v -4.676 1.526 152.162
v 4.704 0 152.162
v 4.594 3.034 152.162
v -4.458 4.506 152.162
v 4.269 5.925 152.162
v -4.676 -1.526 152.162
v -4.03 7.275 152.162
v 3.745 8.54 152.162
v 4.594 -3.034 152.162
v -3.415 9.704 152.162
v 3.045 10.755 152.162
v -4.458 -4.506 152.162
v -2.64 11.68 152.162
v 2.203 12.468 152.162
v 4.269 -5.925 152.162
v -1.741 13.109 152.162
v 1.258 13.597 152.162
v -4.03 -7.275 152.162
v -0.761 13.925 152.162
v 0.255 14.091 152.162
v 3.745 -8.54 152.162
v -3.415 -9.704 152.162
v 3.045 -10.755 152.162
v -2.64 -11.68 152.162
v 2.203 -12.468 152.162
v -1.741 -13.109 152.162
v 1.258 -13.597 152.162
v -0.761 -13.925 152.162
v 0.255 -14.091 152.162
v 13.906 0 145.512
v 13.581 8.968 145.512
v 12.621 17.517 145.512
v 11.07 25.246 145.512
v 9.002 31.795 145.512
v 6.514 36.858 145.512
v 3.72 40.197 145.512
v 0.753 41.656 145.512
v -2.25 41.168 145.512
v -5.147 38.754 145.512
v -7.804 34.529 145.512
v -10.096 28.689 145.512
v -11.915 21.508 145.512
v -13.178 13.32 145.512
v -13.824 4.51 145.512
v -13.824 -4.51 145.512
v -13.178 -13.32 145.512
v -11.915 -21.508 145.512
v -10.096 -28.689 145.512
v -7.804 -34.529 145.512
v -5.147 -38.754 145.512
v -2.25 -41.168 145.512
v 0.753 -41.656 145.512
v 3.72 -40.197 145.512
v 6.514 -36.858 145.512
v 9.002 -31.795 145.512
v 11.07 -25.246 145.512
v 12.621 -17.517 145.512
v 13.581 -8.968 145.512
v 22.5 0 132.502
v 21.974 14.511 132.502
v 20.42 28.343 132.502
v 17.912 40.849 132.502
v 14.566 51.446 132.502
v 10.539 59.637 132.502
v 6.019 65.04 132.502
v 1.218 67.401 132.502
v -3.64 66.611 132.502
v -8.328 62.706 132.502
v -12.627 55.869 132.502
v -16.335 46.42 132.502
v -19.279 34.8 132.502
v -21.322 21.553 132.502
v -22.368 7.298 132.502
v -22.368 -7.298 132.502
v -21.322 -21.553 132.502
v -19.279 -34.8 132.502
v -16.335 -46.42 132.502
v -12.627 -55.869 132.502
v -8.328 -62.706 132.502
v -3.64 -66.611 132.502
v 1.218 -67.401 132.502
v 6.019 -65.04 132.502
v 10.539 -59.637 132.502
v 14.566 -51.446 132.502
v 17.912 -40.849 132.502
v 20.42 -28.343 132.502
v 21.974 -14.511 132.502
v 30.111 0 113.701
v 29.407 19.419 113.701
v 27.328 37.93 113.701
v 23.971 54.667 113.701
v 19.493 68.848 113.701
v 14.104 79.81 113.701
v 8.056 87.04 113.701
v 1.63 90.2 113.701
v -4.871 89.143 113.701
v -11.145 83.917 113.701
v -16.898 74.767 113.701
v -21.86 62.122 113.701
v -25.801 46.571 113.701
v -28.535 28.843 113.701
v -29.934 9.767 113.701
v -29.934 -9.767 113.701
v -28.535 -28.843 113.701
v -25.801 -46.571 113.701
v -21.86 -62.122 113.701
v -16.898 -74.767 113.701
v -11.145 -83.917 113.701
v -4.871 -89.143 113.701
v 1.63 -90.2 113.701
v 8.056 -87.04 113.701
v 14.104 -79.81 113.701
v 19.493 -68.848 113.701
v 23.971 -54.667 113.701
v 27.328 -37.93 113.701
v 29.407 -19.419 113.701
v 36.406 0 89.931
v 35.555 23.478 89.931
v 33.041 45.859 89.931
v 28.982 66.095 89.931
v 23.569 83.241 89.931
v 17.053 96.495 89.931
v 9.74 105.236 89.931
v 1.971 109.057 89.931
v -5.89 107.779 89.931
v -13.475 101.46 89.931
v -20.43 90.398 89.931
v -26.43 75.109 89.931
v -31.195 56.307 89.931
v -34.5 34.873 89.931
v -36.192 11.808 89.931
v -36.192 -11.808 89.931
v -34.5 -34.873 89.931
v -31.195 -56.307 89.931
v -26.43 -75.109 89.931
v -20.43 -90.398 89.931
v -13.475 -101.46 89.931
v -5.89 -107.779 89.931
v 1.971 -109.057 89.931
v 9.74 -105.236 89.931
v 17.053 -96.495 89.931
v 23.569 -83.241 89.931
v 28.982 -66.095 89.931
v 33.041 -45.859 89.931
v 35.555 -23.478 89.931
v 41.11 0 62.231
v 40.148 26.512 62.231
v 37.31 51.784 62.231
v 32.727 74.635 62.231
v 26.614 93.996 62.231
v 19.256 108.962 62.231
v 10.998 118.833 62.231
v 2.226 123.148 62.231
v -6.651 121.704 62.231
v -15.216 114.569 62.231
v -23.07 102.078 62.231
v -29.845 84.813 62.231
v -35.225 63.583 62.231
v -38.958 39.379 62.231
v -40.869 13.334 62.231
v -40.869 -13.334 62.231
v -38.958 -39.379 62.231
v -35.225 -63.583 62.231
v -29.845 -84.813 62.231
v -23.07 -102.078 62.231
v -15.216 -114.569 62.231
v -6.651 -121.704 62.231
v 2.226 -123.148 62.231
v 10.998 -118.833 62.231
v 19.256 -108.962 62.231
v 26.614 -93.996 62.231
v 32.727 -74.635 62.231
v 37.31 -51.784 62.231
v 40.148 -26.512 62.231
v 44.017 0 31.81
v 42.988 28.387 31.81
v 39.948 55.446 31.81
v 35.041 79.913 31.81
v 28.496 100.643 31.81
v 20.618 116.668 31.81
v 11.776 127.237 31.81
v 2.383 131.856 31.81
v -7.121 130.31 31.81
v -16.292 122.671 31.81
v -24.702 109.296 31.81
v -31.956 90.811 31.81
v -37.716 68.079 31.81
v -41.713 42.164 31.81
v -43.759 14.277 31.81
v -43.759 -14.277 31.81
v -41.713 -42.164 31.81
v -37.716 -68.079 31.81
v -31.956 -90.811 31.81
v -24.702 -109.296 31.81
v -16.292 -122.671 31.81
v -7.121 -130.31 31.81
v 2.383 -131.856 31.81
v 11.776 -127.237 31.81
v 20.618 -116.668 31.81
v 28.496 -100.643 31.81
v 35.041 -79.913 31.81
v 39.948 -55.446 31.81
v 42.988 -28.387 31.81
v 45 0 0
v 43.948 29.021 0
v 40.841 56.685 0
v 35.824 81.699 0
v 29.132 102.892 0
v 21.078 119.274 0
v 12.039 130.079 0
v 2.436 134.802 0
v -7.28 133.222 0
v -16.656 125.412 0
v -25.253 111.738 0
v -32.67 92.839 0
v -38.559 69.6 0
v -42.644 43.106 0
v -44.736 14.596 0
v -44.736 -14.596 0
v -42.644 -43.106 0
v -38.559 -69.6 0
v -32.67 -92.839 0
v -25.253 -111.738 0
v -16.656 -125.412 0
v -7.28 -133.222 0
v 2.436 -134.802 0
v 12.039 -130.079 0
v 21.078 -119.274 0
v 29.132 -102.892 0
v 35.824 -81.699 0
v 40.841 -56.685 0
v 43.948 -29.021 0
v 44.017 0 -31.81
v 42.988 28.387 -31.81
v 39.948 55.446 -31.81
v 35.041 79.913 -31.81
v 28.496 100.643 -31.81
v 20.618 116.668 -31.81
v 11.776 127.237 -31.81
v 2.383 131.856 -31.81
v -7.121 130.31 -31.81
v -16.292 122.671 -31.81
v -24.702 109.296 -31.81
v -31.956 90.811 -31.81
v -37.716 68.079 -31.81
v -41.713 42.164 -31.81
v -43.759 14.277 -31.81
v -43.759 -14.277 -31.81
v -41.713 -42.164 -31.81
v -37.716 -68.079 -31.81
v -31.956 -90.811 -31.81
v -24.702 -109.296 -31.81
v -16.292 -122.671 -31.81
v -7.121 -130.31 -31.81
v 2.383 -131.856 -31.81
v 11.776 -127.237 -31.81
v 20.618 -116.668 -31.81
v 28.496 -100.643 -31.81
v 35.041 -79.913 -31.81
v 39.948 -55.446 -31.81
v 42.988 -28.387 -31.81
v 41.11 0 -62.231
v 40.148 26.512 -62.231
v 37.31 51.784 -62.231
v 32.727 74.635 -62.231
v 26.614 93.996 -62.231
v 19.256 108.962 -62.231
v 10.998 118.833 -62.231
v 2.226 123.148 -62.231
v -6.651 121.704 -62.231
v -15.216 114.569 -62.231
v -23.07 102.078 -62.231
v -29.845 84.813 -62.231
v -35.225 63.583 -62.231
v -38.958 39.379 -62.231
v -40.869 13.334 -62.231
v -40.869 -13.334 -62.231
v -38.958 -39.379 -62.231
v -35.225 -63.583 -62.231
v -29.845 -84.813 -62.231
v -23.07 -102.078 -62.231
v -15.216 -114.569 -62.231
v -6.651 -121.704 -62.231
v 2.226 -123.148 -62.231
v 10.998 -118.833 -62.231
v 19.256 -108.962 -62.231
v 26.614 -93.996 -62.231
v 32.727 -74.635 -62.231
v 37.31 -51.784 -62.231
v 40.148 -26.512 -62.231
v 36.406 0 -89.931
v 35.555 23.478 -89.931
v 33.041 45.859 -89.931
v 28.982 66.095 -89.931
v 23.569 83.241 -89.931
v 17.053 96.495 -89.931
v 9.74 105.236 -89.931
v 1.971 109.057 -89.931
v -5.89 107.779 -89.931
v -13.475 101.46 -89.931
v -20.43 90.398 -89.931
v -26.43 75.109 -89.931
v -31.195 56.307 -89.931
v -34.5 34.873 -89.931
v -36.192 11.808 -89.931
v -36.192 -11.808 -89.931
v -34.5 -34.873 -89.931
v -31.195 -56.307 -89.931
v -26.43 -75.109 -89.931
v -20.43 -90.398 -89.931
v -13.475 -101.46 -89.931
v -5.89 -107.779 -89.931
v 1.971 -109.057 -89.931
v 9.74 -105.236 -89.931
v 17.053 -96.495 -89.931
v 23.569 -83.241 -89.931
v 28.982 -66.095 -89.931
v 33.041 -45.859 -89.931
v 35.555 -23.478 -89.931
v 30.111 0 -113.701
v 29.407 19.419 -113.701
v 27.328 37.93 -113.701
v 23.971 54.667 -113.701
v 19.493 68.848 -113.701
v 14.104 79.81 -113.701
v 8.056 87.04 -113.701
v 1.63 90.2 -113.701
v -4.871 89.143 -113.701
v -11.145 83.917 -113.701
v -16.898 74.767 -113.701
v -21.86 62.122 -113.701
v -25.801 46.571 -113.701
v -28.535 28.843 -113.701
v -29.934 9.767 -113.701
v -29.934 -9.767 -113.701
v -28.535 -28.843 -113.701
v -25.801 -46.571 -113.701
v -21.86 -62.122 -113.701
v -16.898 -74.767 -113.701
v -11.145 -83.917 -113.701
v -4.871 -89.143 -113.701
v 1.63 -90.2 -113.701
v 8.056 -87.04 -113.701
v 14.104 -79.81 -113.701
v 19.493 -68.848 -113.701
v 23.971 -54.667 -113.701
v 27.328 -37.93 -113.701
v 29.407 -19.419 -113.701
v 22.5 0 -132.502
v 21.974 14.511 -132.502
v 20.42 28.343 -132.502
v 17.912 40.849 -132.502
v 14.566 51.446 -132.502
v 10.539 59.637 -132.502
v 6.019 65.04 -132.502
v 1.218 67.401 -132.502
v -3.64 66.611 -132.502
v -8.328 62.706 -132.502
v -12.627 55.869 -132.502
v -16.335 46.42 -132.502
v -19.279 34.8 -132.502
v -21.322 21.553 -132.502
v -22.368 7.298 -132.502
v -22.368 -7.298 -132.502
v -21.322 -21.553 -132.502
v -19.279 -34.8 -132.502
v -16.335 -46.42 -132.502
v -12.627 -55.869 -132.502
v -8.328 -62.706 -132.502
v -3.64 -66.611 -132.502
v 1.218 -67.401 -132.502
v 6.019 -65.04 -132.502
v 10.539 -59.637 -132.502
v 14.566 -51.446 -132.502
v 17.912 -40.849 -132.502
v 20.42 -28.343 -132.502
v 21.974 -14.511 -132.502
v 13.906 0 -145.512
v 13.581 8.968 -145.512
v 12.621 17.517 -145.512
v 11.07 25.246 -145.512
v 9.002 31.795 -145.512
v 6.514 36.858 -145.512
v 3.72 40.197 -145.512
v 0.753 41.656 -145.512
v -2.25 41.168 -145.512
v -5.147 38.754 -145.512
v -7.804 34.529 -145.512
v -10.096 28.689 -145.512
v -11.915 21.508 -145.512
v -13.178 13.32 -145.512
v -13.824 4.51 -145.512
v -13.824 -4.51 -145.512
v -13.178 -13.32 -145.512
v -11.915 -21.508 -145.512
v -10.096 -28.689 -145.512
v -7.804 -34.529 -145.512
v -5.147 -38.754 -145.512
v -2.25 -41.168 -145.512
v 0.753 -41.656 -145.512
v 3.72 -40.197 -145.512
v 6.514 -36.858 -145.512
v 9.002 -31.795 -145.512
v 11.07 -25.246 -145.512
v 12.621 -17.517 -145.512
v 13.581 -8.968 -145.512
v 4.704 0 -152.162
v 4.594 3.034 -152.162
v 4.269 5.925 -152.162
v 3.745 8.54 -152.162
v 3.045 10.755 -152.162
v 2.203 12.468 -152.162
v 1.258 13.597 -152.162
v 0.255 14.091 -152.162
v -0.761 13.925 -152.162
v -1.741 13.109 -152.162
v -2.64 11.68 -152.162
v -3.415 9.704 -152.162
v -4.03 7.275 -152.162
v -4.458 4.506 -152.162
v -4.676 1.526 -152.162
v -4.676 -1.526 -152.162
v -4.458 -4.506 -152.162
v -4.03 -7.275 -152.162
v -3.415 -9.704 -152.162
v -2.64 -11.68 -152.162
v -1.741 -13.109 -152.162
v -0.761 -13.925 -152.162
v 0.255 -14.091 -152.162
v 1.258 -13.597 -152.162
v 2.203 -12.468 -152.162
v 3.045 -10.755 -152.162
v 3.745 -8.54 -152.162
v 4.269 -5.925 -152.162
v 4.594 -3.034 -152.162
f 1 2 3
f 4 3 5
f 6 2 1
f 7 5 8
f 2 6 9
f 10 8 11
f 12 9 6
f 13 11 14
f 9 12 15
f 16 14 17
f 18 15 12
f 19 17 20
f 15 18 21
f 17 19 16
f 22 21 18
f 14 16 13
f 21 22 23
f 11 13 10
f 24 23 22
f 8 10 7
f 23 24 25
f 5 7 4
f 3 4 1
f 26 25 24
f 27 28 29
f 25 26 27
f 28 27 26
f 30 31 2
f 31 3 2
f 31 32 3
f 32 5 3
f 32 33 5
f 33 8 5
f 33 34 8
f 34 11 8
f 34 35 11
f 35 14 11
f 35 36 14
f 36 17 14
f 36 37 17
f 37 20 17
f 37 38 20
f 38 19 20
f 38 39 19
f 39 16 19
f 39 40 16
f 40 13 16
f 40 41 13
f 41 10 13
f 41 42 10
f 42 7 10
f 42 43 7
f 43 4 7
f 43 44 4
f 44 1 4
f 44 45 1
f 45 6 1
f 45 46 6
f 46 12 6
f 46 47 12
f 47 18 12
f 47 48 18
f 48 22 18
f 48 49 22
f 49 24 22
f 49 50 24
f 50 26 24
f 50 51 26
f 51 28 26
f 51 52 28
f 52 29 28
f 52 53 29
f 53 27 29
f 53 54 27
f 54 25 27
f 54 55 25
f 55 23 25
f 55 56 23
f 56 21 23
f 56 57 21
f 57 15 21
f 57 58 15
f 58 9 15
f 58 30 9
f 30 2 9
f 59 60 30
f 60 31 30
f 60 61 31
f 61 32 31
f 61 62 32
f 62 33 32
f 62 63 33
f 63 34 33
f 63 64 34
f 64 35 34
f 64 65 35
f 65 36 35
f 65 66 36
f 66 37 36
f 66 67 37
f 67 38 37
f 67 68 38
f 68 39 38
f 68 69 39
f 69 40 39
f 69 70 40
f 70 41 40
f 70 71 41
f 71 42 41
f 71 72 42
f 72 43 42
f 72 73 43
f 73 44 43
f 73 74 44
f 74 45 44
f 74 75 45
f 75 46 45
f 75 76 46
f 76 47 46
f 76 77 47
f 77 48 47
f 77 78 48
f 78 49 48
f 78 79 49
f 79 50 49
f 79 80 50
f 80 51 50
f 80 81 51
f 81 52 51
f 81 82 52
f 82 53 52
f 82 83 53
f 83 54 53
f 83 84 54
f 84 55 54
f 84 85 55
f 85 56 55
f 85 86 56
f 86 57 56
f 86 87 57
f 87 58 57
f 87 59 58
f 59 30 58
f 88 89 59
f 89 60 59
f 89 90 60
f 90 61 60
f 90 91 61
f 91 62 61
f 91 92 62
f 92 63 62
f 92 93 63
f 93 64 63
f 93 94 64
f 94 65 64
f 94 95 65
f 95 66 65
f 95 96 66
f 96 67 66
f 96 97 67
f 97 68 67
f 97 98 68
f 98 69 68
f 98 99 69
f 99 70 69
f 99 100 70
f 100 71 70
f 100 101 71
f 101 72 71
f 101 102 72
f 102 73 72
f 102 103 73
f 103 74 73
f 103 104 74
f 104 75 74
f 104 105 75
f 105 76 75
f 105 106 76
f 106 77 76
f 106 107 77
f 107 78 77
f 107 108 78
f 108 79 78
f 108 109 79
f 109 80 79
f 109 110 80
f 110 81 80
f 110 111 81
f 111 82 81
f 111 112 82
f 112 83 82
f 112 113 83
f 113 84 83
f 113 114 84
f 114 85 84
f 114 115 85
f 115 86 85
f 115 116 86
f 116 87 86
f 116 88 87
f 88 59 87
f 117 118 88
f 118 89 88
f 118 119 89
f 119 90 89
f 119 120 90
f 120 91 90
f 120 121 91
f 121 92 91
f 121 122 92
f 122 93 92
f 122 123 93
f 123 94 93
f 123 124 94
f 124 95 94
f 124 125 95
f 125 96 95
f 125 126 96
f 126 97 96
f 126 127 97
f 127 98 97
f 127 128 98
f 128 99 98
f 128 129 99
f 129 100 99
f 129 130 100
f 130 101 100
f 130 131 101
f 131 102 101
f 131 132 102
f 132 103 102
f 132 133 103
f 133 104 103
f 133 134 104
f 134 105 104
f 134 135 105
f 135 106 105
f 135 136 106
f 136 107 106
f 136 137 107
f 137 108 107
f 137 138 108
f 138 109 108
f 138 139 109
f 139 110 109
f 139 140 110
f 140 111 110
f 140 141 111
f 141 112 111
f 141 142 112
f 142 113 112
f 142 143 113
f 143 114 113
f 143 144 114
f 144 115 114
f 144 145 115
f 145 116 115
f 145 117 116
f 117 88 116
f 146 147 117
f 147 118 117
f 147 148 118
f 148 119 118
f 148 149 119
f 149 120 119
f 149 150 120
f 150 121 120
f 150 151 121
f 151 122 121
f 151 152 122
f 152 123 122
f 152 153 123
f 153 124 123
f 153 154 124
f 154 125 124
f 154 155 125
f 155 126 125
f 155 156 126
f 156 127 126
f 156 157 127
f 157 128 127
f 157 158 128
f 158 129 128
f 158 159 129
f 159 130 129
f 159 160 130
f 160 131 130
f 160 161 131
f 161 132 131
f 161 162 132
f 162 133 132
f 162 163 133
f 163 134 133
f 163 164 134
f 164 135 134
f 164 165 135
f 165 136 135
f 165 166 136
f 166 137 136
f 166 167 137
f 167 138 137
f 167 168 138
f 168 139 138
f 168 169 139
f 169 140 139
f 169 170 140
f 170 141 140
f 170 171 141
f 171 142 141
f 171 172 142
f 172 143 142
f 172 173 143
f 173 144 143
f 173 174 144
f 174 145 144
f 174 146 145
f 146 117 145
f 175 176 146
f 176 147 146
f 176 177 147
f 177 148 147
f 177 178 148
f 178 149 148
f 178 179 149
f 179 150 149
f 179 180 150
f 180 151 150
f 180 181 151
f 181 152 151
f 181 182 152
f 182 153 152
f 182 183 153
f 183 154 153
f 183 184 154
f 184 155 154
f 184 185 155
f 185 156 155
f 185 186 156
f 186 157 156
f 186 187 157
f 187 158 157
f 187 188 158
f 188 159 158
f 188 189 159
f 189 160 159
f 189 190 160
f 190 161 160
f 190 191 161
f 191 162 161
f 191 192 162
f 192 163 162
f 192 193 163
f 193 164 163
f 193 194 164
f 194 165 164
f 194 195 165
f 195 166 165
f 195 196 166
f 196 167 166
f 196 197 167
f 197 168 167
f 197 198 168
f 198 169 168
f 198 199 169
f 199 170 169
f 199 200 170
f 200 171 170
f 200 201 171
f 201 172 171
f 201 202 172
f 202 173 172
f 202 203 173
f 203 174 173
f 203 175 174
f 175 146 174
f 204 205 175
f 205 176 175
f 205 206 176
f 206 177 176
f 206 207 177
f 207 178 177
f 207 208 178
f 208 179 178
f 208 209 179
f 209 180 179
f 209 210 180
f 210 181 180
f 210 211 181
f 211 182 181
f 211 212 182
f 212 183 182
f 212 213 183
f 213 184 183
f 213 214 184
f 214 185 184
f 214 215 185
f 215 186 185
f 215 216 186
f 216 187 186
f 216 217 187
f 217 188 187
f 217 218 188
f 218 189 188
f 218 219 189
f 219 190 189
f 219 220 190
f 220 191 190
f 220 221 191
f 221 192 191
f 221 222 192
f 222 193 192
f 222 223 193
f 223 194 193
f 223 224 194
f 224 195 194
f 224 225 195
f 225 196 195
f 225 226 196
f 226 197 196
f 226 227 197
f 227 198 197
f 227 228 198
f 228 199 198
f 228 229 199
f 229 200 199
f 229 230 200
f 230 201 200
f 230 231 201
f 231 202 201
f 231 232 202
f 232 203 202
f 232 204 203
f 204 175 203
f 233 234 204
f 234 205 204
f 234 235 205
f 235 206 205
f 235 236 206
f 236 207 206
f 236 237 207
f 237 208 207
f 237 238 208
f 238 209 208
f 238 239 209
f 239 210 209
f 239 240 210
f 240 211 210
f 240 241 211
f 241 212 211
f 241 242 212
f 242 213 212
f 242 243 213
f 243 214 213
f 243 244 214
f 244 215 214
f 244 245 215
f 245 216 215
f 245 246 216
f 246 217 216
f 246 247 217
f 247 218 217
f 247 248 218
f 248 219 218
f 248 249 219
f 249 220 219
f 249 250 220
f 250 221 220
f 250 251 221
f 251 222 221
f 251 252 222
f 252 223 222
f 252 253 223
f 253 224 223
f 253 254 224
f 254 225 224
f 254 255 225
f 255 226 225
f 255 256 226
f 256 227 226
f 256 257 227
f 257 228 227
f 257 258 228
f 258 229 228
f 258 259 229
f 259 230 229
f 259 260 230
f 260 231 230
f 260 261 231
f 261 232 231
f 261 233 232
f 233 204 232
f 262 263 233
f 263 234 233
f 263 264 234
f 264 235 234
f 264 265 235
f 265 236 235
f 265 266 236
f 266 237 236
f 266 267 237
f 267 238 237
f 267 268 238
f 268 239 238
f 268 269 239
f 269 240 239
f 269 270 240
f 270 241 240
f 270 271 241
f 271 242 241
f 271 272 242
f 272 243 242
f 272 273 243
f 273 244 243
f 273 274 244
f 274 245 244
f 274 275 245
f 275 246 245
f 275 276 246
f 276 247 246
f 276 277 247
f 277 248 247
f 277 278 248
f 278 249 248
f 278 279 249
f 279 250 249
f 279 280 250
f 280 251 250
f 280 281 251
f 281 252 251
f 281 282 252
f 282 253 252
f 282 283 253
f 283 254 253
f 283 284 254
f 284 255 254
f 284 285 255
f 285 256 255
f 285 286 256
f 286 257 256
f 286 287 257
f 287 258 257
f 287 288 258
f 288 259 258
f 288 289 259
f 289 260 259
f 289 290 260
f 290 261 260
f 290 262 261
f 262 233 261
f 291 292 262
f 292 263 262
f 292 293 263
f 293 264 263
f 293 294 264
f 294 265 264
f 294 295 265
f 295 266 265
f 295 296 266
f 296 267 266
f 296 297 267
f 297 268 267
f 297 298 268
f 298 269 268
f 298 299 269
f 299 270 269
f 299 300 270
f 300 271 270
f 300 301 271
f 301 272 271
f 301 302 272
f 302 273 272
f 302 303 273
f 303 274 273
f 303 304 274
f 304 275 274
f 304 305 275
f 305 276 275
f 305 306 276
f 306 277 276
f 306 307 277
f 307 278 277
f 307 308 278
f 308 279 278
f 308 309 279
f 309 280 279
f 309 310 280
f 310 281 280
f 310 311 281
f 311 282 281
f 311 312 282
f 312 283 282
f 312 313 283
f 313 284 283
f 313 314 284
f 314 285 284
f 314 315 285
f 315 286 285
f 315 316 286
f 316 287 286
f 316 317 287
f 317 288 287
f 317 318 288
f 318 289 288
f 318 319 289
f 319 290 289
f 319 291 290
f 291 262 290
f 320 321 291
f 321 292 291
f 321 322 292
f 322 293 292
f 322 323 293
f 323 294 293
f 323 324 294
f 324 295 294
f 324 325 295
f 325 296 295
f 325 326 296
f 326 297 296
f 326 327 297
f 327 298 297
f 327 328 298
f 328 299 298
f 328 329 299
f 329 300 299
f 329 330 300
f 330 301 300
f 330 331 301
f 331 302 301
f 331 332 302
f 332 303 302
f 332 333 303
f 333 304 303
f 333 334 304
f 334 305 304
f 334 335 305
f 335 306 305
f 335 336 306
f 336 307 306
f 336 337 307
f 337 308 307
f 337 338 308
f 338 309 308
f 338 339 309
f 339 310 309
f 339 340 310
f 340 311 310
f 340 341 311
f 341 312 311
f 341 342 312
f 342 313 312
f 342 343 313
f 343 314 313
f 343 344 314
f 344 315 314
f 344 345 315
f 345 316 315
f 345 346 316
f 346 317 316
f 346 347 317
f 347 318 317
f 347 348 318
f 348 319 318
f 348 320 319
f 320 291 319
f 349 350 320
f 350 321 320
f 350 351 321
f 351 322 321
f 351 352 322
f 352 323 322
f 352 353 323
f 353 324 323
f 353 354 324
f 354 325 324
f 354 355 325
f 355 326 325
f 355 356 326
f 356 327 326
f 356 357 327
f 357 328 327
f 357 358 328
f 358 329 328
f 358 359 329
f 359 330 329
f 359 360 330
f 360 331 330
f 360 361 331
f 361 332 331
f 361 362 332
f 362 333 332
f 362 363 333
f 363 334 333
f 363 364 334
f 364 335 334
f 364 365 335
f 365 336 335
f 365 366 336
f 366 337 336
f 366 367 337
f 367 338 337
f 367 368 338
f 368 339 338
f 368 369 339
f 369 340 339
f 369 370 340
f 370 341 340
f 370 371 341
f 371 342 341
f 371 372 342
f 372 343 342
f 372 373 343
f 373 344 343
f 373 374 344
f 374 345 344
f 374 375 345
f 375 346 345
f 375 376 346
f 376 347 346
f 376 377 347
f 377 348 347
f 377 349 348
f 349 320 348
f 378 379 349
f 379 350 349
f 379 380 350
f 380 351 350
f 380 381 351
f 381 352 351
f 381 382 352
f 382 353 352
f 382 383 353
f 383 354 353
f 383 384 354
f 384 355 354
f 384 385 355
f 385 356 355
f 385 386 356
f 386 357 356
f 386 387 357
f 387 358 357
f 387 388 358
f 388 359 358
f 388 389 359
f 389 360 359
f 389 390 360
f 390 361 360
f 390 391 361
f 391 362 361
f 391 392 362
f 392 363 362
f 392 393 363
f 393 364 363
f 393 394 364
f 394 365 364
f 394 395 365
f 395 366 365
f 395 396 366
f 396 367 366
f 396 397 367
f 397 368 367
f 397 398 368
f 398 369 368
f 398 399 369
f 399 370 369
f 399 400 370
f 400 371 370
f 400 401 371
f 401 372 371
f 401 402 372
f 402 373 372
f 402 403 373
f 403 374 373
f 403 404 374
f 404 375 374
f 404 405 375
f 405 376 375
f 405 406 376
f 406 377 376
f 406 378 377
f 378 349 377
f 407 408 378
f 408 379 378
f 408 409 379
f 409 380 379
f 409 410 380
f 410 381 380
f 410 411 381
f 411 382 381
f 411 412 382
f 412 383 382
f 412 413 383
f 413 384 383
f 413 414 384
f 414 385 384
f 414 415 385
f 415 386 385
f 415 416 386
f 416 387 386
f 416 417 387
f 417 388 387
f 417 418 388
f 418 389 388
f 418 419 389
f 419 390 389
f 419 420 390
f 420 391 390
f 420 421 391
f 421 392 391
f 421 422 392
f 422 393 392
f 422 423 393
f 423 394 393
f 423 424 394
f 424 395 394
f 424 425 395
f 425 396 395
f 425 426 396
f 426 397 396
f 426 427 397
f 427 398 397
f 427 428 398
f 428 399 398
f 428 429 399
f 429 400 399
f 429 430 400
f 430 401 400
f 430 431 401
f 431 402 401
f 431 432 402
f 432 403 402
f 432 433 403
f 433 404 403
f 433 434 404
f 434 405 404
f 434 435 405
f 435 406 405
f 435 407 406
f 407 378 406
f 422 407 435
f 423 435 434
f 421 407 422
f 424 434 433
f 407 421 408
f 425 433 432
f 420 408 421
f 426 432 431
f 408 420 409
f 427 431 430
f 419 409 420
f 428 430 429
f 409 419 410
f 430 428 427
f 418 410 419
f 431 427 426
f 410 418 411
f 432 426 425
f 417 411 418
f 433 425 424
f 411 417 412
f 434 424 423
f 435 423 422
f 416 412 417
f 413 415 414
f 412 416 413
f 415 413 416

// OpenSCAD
// Generated by SolidPython 1.0.1 on 2020-07-29 00:46:46


scale(v = [5, 15, 17]) {
	sphere(r = 9);
}
/***********************************************
*********      SolidPython code:      **********
************************************************
 
# import packages: SolidPython
from solid import *
from solid.utils import *
from itertools import chain, combinations, permutations


class Resize:

    def __init__(self, scad_file):
        self.scad_file = scad_file
        #self.scad_file = import_scad(scad_file)
        # cone/cylinder param:
        self.r1 = 0
        self.r2 = 0
        self.h = 0
        # rectangular prism param:
        self.w = 0
        self.l = 0
        # ellipse param:
        self.r = 0

    # import OpenScad code (file name corresponds to shape)


    # classify shape + parameters
    def assign(self, param1, param2, param3):
        if self.scad_file == 'cone.scad':
            self.r1 = param1
            self.r2 = param2
            self.h = param3
        elif self.scad_file == 'cylinder.scad':
            self.r1 = param1
            self.r2 = param2
            self.h = param3
        elif self.scad_file == 'rectangularPrism.scad':
            self.h = param1
            self.l = param2
            self.w = param3
        else:
            self.r = param1
            self.h = param2

    # resize parameters
    def iterate(self):
        x = range(3, 20, 2)
        i = 1
        if self.scad_file == 'cone.scad':
            tempList = list(permutations(x, 2))
            for temp in tempList:
                param1 = temp[0]
                param2 = temp[1]
                filepath = 'produced_scad_files/' + 'cone' + str(param1) + '_' + str(param2) + '_' + '.scad'
                scad_render_to_file(cylinder(h=param1, r1=param2, r2=0), filepath)

        elif self.scad_file == 'cylinder.scad':
            tempList = list(permutations(x, 3))
            for temp in tempList:
                param1 = temp[0]
                param2 = temp[1]
                filepath = 'produced_scad_files/' + 'cylinder' + str(param1) + '_' + str(param2) + '_' + '.scad'
                scad_render_to_file(cylinder(h=param1, r1=param2, r2=param2), filepath)

        elif self.scad_file == 'rectangularPrism.scad':
            tempList = list(permutations(x, 3))
            for temp in tempList:
                param1 = temp[0]
                param2 = temp[1]
                param3 = temp[2]
                filepath = 'produced_scad_files/' + 'rectangularPrism' + str(param1) + '_' + str(param2) + '_' + str(
                    param3) + '.scad'
                scad_render_to_file(cube(size=(param1, param2, param3)), filepath)

        elif self.scad_file == 'ellipse.scad':
            tempList = list(permutations(x, 4))
            for temp in tempList:
                param1 = temp[0]
                param2 = temp[1]
                param3 = temp[2]
                param4 = temp[3]
                filepath = 'produced_scad_files/' + 'ellipse' + str(param1) + '_' + str(param2) + '_' + str(param3) + '_' + str(param4) + '.scad'
                scad_render_to_file(scale([param1, param2, param3])(sphere(r=param4)), filepath)

    def render_to_scadfile(self):
        scad_render_to_file(scad, 'example.scad') 
 
************************************************/
